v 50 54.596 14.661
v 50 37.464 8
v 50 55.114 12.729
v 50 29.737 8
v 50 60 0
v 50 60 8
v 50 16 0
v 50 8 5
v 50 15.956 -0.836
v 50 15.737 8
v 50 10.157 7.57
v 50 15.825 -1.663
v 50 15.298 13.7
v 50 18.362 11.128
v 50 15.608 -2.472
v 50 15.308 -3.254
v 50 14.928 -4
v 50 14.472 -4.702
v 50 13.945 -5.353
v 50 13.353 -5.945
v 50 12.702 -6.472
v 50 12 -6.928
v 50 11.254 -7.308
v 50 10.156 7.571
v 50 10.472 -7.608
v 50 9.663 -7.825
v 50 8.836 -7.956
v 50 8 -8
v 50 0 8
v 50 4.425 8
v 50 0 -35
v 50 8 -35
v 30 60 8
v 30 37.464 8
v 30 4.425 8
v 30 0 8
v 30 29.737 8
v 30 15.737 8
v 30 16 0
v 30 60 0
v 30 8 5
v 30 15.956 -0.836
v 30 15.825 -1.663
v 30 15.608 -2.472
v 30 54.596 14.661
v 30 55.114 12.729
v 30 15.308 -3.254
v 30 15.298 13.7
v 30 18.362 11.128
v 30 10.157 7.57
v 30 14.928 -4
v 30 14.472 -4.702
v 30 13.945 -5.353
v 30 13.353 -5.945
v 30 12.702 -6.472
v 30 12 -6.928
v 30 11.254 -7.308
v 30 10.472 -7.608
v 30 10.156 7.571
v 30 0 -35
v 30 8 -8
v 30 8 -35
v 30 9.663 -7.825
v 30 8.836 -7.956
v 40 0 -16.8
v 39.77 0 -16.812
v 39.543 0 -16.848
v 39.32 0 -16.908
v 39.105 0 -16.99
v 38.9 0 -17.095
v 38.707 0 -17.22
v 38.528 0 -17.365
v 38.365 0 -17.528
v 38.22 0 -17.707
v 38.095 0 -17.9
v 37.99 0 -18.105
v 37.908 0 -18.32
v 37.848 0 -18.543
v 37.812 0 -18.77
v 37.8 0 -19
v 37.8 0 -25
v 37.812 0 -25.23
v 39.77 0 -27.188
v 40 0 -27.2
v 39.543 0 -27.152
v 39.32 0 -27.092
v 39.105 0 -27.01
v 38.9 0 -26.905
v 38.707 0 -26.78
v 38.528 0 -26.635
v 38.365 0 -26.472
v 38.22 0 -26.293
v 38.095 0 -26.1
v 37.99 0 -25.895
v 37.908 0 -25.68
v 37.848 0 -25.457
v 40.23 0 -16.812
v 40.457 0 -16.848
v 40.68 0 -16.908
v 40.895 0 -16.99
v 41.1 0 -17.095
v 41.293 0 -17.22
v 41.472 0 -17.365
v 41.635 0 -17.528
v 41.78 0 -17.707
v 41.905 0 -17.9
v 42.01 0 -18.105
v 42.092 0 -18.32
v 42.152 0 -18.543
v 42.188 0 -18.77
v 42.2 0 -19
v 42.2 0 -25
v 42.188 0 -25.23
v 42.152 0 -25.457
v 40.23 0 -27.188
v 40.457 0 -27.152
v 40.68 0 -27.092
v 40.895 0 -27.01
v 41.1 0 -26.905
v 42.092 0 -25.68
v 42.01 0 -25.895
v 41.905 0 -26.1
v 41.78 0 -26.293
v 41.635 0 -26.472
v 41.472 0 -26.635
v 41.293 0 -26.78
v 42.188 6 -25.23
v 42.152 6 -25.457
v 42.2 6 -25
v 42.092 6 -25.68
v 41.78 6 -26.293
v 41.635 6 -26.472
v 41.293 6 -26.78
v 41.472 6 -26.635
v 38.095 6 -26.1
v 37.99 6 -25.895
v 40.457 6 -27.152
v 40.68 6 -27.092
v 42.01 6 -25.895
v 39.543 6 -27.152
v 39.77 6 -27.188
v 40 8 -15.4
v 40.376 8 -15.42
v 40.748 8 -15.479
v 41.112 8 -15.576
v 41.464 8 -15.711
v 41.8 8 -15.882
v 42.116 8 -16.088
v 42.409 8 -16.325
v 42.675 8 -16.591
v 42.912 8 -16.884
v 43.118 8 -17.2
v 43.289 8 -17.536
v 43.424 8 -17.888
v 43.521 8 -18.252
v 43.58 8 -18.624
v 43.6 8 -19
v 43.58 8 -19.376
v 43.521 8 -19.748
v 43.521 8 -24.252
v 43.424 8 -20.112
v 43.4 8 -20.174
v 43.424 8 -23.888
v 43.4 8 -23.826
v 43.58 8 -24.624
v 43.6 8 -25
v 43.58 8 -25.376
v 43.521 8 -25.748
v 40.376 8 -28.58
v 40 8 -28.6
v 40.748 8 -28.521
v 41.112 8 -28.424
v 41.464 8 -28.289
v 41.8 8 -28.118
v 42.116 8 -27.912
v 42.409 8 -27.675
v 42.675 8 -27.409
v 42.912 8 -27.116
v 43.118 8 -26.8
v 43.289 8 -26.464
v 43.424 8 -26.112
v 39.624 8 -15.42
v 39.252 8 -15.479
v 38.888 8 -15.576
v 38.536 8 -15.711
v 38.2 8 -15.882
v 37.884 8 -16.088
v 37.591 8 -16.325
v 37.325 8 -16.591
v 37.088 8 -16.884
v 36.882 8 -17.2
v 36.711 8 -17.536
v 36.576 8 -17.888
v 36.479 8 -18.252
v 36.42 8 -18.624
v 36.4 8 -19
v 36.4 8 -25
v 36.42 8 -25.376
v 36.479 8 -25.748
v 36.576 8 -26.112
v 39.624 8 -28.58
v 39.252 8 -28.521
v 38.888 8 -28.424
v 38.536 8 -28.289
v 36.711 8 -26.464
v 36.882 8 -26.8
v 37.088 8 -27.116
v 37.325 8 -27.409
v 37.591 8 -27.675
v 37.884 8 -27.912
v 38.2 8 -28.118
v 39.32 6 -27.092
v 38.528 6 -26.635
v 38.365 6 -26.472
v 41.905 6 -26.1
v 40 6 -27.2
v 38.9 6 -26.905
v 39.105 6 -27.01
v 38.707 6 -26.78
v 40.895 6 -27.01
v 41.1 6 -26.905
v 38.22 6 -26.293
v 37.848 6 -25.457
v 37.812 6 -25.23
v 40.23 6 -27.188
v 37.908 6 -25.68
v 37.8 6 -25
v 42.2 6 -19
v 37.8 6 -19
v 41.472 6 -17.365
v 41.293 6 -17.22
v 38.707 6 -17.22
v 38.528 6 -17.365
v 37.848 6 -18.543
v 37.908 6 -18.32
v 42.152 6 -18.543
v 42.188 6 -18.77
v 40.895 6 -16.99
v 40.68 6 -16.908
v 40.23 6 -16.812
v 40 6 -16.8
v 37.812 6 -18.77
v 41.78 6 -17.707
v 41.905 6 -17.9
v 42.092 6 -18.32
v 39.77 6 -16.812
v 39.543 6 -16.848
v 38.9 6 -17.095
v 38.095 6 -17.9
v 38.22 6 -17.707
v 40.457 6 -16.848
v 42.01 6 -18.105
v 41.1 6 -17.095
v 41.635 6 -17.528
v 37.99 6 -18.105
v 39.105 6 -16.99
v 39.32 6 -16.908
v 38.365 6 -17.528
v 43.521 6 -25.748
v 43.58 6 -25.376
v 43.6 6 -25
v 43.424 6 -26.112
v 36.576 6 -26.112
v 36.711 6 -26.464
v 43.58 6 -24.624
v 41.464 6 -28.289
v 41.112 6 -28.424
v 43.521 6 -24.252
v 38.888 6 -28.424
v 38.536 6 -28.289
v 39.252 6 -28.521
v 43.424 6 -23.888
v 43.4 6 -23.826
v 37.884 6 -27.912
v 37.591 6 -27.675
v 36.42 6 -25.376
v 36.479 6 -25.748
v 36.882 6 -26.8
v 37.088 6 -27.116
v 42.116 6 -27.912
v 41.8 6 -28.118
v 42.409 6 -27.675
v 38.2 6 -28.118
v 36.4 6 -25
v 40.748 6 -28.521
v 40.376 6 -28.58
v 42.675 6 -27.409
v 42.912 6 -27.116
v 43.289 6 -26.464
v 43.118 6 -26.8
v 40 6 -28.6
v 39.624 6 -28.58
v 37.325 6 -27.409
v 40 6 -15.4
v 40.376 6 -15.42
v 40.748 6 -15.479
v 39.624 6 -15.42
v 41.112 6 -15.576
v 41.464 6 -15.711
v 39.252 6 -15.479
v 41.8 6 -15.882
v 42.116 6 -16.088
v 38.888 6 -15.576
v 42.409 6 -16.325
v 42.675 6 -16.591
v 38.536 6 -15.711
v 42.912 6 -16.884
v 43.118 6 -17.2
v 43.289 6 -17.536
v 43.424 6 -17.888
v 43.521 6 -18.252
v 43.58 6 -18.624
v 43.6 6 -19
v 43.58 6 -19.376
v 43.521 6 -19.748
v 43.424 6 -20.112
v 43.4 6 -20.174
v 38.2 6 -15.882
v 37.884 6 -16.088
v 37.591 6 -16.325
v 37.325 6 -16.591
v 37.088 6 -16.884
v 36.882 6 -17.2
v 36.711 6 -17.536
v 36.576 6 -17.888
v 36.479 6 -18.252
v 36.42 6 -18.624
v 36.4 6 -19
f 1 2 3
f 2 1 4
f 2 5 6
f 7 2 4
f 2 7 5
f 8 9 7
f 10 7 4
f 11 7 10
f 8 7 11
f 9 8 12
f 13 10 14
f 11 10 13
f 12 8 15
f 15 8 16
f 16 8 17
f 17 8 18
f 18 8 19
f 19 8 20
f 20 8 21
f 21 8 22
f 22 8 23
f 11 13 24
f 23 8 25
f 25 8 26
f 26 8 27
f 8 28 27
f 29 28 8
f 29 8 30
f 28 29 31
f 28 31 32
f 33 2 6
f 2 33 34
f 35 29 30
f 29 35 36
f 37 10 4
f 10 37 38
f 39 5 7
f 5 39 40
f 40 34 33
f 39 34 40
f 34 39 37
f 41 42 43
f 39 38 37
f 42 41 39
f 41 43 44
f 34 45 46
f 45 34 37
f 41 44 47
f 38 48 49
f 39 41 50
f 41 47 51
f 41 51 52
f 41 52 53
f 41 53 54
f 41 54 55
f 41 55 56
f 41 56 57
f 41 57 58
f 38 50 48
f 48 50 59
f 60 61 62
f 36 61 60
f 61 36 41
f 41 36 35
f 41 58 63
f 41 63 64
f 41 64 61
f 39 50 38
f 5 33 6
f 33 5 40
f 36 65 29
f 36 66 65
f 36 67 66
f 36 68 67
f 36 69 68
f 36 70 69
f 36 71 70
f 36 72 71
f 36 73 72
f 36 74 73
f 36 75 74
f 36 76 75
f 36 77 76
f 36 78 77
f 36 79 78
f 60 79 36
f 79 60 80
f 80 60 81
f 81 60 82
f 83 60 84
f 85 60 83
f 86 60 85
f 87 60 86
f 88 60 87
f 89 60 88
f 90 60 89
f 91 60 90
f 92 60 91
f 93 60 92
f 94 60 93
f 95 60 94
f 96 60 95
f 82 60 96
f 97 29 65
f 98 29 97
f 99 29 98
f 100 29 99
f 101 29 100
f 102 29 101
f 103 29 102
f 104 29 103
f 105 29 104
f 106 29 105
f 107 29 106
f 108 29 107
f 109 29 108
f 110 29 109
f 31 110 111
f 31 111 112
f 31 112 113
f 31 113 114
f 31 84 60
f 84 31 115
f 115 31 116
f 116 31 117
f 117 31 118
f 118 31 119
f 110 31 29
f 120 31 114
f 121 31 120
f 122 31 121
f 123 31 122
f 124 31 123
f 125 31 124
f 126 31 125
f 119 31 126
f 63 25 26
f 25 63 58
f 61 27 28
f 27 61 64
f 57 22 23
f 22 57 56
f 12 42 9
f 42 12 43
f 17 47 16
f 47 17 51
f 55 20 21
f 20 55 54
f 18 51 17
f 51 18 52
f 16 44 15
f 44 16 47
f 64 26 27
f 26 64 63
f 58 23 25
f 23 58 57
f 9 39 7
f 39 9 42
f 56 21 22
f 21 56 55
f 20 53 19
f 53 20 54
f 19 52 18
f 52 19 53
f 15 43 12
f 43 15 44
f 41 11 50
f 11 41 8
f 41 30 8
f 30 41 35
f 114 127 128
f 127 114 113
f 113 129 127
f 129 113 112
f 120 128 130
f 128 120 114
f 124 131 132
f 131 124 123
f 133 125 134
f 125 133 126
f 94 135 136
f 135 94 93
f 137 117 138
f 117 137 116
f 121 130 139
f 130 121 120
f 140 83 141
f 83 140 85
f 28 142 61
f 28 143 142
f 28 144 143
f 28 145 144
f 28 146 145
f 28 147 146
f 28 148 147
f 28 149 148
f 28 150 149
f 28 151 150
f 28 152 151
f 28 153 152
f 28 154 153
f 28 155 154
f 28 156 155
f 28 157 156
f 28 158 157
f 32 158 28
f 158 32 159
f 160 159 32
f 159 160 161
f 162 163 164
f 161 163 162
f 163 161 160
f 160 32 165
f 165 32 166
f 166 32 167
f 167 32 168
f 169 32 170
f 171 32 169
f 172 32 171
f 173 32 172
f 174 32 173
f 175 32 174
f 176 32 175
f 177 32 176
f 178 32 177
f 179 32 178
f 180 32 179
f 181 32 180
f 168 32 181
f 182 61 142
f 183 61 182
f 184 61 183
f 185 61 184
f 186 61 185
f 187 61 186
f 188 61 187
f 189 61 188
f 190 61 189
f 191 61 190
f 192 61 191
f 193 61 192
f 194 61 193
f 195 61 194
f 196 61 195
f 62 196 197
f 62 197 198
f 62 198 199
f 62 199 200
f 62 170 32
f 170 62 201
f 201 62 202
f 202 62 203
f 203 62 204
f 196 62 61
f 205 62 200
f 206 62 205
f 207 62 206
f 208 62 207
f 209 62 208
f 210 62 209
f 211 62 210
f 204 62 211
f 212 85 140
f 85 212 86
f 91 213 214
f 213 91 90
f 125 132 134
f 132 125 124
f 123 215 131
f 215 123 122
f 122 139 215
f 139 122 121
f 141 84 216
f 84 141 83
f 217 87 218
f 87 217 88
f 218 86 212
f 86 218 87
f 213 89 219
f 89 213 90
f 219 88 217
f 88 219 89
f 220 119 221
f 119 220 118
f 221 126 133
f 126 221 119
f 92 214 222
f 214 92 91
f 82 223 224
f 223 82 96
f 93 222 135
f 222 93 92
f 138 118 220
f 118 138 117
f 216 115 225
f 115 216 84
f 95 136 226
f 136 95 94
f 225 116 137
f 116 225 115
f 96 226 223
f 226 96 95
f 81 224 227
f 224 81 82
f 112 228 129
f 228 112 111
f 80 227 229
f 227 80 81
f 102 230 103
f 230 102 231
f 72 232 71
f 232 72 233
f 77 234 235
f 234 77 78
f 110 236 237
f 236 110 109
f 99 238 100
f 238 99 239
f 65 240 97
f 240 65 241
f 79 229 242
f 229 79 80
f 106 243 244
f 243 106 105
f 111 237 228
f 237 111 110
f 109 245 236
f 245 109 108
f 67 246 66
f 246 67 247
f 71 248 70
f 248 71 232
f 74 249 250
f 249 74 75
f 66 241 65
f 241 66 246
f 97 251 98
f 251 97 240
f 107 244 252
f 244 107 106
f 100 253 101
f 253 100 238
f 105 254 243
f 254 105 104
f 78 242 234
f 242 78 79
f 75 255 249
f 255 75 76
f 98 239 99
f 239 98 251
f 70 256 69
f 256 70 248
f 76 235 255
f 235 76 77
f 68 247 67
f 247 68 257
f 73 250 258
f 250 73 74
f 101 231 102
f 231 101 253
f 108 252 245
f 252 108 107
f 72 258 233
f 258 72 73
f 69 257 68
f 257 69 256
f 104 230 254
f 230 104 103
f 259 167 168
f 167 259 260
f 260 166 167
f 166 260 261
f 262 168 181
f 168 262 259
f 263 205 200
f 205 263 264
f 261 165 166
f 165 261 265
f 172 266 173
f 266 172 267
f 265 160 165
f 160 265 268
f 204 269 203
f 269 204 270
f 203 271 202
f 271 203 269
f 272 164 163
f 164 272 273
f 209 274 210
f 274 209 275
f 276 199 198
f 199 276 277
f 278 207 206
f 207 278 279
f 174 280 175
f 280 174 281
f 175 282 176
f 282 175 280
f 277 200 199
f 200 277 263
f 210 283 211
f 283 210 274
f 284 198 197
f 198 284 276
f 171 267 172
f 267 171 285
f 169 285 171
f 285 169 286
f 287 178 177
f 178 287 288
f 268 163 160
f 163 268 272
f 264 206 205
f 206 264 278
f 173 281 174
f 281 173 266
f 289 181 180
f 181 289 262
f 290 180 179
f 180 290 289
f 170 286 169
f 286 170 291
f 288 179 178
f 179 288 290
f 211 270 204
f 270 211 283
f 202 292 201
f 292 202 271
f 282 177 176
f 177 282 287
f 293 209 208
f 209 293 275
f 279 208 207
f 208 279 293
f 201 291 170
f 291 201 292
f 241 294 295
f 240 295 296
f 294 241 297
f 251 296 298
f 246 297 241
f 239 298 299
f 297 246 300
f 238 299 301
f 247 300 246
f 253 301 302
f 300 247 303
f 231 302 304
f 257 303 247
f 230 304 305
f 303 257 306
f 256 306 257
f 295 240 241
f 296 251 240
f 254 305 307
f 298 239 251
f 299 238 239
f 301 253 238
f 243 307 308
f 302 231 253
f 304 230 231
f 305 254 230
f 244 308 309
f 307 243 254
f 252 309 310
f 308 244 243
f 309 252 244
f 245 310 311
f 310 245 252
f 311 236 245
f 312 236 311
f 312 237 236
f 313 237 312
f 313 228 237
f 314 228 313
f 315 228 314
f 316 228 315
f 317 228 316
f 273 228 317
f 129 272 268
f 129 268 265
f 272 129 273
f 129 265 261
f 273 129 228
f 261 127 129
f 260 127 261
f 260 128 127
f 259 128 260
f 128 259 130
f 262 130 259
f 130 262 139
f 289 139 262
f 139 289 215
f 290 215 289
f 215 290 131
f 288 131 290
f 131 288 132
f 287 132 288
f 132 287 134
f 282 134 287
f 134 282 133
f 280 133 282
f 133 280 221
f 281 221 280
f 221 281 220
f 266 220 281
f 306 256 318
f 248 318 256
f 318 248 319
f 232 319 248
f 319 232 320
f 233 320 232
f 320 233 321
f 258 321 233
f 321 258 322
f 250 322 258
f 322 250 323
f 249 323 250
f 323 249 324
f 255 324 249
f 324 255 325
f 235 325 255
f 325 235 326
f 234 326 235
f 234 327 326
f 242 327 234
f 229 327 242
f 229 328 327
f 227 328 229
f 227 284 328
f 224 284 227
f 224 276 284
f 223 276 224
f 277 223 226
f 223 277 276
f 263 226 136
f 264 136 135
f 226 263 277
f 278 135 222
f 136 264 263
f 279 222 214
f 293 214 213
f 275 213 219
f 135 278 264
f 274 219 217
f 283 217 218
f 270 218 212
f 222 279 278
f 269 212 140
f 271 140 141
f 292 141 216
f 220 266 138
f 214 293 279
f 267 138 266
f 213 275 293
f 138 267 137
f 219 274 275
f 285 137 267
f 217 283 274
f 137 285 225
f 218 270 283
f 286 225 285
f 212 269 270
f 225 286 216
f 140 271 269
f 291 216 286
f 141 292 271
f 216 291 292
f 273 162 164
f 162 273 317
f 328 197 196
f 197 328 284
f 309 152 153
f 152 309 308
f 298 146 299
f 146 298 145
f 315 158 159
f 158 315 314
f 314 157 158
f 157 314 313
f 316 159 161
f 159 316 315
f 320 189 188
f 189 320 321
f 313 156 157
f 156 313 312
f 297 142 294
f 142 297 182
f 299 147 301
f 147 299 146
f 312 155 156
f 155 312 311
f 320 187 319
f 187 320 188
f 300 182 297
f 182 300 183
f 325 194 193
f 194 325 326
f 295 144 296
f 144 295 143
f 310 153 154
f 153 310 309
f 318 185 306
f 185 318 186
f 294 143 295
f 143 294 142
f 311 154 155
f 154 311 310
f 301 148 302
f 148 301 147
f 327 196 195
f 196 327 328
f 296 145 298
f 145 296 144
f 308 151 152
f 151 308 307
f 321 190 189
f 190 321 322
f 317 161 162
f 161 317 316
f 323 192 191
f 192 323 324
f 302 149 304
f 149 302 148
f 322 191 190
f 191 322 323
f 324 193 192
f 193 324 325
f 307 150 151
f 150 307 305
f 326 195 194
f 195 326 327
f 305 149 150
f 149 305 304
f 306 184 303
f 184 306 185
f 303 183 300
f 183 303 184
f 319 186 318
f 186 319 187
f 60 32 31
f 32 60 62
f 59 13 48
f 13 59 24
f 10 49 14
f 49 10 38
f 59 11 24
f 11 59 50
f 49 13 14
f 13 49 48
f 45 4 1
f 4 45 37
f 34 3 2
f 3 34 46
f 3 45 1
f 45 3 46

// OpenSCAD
$fn = 60;

w = 20;
t = 8;

//--------------------------------------------------------

translate([30, 0, 0]) {
difference() {
	  union() {
			cube([w, 60, t]);
			translate([0, t, 0]) rotate([0, 90, 0]) cylinder(h=w, d= t*2);
	  }
	  translate([0, 12 - 4, t - 3]) rotate([50, 0, 0]) cube([w, w, w]);
}
translate([0, 17.22 - 4, t - 3]) rotate([50, 0, 0]) cube([w, 8, 4]);

translate([0,0, -35]) difference() {
	  cube([w, t, 35]);
	  translate([w/2, 0, 10]) {
			rotate([-90, 0, 0]) cylinder(h=t, d= 4.4);
			translate([-4.4/2, 0, 0]) cube([4.4, t, 6]);
			translate([0, 0, 6]) rotate([-90, 0, 0]) cylinder(h=t, d= 4.4);
	  }
	  translate([w/2, t-2, 10]) {
			rotate([-90, 0, 0]) cylinder(h=t, d= 7.2);
			translate([-7.2/2, 0, 0]) cube([7, t, 6]);
			translate([0, 0, 6]) rotate([-90, 0, 0]) cylinder(h=t, d= 7.2);
	  }
}

translate([0, 30, t-2]) rotate([15, 0, 0]) cube([w, 26, 2]);
}
